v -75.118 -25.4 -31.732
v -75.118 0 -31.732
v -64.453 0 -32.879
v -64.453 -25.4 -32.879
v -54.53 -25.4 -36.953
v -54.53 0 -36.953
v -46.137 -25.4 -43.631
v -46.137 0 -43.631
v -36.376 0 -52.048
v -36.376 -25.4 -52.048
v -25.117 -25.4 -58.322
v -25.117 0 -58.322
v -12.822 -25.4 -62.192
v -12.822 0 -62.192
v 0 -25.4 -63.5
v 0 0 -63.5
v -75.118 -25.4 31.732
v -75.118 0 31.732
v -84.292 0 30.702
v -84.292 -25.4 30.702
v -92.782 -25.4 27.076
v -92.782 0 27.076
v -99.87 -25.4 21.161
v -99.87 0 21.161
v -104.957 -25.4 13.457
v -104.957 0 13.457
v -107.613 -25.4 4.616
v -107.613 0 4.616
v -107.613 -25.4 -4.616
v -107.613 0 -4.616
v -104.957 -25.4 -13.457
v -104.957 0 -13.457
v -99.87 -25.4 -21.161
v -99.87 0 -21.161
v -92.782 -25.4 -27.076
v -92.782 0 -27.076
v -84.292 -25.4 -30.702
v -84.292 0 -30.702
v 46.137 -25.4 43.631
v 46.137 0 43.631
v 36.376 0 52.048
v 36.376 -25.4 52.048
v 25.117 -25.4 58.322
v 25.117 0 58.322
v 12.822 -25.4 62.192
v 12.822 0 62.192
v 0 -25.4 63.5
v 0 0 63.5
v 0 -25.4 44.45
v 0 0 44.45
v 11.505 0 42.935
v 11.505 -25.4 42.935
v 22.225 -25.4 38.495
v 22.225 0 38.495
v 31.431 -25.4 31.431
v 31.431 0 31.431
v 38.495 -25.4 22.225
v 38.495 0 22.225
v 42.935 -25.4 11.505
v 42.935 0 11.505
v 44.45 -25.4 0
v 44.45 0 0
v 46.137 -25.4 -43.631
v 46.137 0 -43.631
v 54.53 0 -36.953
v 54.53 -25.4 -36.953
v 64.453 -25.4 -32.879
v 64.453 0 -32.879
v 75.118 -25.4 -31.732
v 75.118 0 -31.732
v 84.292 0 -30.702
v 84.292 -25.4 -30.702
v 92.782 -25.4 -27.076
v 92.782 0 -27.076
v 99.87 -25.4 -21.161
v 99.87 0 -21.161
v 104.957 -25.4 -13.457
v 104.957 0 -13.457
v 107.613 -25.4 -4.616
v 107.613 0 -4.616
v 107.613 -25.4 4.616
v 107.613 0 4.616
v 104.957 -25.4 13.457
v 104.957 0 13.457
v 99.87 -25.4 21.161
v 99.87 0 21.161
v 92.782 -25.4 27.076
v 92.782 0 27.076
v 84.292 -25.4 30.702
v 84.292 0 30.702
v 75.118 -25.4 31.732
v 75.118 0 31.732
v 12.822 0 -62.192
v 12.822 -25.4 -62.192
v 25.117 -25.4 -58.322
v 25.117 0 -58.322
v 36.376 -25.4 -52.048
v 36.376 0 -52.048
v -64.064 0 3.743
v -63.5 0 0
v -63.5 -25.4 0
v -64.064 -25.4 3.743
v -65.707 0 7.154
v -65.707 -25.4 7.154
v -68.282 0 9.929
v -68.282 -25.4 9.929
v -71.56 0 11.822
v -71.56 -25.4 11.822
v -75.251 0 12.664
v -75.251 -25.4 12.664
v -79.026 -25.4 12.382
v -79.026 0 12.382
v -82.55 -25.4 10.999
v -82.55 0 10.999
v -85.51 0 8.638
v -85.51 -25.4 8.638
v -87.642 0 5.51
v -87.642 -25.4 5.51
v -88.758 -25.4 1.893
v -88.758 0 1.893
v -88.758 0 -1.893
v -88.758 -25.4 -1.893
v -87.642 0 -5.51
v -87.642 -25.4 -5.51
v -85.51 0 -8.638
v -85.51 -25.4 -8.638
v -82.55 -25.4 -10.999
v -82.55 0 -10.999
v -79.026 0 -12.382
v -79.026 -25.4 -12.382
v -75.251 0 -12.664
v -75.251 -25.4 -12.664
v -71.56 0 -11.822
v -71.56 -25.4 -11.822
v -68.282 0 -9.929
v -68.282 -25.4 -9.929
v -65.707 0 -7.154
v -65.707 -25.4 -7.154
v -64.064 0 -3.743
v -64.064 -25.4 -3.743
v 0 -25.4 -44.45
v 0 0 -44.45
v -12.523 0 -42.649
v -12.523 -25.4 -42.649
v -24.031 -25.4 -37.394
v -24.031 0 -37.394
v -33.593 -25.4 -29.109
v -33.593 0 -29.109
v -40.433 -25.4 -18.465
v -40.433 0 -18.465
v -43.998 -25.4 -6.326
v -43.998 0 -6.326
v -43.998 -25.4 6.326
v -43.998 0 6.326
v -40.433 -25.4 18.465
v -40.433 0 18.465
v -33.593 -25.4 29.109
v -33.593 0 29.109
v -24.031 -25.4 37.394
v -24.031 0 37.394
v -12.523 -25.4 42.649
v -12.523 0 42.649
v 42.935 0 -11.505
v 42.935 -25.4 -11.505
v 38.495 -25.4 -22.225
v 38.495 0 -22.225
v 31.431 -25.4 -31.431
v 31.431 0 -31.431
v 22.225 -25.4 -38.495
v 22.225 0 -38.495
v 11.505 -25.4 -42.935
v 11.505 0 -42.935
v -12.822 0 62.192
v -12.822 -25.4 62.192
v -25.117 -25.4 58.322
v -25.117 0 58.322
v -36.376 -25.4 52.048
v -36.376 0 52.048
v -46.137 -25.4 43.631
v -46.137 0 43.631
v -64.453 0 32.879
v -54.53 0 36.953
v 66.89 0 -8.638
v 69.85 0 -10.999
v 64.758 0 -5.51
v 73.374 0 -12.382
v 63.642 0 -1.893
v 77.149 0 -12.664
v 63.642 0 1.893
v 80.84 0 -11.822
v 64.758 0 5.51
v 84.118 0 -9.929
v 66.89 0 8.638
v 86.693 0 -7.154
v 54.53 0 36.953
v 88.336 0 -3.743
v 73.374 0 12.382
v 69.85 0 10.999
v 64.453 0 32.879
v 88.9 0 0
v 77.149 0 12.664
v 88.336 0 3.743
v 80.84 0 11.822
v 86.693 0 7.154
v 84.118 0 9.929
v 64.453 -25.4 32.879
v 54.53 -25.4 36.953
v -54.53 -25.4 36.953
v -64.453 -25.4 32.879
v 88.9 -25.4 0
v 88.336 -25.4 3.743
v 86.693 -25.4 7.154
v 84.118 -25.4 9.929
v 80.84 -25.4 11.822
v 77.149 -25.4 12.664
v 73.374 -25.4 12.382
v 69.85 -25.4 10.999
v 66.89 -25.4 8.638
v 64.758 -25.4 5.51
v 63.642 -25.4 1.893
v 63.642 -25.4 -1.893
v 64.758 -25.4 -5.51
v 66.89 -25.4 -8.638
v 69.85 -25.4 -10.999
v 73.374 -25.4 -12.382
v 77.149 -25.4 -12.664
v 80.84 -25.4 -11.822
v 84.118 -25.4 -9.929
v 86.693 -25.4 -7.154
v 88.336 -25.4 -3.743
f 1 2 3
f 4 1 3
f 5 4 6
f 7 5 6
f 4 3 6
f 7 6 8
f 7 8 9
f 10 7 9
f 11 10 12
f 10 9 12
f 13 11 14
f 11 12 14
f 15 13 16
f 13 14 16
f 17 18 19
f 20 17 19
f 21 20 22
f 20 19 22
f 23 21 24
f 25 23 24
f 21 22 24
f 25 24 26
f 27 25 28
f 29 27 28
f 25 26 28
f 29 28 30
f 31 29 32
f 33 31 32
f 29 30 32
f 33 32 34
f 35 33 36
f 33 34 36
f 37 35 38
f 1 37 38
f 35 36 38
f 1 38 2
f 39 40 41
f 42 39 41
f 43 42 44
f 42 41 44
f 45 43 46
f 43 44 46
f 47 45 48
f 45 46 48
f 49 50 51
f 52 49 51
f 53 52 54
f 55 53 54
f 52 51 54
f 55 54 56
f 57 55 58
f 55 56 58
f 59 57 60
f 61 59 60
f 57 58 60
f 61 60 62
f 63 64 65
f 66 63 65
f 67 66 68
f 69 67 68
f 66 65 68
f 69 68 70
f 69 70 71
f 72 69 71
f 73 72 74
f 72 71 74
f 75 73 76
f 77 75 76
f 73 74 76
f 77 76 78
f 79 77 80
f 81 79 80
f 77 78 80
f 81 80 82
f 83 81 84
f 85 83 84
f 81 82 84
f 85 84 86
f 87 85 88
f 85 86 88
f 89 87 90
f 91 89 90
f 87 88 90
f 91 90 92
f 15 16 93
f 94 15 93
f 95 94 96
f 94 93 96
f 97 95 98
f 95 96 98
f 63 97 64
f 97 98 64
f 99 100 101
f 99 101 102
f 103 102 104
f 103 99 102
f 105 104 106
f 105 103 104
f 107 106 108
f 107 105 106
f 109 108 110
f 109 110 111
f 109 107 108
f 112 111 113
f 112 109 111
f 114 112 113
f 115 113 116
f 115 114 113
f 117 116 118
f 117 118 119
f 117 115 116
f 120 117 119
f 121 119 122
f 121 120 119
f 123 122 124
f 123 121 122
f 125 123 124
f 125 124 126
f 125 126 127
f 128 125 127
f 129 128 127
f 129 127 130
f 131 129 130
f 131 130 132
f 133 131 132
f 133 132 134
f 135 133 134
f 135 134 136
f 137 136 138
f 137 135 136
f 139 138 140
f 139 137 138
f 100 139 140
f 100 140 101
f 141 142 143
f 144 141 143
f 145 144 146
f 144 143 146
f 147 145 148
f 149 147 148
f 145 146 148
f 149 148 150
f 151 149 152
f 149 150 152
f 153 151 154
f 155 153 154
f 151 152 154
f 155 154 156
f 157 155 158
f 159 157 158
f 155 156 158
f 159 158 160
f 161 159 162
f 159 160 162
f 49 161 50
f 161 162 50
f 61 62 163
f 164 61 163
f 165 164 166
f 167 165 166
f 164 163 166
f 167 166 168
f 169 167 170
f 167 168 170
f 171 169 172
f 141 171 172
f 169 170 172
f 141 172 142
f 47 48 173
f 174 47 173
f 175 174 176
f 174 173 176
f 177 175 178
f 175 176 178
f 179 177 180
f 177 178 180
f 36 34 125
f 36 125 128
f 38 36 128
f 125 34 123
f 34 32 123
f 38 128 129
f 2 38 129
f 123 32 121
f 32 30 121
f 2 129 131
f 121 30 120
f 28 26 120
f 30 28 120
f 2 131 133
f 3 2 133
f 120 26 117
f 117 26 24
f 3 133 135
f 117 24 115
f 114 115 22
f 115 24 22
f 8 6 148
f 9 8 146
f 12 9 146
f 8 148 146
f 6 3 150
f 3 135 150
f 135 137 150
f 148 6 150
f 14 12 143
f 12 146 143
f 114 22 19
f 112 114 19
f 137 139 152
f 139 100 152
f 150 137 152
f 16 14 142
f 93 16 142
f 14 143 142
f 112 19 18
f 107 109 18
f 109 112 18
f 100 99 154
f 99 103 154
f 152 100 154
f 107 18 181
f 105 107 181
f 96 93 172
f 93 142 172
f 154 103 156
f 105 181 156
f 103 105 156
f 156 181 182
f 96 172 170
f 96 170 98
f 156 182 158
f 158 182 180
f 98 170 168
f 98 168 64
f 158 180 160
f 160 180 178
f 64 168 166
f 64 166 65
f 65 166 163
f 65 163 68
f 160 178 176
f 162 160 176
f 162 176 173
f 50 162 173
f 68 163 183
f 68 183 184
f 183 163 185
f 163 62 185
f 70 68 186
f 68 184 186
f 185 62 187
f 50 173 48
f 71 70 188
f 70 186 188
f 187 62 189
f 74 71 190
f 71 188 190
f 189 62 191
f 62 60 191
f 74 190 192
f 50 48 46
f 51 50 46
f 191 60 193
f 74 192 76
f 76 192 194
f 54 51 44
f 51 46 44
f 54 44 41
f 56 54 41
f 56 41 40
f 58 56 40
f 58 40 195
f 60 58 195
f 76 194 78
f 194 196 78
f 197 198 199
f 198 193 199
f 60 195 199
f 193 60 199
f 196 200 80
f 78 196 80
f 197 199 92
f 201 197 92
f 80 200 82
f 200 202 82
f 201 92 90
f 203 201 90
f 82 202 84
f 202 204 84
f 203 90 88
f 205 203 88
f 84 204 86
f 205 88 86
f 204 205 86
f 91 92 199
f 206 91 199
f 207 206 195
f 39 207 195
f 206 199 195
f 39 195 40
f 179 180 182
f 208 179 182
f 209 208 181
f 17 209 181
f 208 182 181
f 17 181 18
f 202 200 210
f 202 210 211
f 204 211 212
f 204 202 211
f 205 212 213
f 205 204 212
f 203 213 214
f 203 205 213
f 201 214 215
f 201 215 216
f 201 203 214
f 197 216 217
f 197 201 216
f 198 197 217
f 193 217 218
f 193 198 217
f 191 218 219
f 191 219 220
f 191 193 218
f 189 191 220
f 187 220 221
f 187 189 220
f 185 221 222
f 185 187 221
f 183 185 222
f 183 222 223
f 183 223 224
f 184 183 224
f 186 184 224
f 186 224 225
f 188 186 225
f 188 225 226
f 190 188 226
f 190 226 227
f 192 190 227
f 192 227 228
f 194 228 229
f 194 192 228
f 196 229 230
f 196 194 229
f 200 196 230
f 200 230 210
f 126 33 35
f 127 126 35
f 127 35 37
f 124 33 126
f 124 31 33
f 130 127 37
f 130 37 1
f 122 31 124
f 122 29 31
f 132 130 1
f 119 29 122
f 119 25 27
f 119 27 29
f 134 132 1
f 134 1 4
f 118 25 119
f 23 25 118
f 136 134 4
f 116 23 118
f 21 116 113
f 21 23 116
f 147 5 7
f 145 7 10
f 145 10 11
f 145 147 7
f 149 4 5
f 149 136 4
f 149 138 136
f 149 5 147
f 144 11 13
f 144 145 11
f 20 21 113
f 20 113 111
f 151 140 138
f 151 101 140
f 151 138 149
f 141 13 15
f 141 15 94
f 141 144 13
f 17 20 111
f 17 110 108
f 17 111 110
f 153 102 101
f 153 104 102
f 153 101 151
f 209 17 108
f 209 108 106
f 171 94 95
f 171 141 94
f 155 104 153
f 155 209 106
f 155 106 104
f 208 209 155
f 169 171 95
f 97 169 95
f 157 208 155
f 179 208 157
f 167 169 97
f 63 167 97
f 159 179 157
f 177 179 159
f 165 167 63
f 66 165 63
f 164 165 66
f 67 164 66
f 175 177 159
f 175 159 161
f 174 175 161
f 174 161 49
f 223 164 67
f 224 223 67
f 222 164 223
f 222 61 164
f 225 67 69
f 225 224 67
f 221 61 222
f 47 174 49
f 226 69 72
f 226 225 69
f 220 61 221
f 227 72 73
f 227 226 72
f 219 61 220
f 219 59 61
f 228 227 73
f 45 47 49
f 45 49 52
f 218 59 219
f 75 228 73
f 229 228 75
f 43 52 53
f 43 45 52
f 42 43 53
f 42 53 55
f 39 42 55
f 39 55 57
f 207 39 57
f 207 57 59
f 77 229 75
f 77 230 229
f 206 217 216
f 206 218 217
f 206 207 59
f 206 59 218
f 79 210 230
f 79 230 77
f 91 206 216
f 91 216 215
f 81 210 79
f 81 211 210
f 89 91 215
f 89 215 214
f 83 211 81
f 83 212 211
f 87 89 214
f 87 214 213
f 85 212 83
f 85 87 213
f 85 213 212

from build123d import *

# Parameters (mm, degrees)
F0_R     = 12.7
F1_DEPTH = 25.4


with BuildPart() as f1:
    # F0 (on Front) → F1 (new body)
    with BuildSketch(Plane.XZ):
        with BuildLine():
            ThreePointArc((0, -44.45), (-44.45, 0), (0, 44.45))
            Line((0, 44.45), (0, 63.5))
            ThreePointArc((0, 63.5), (-25.116623, 58.321568), (-46.136719, 43.630874))
            ThreePointArc((-46.136719, 43.630874), (-59.347524, 34.564632), (-75.117614, 31.731545))
            ThreePointArc((-75.117614, 31.731545), (-107.95, 0), (-75.117614, -31.731545))
            ThreePointArc((-75.117614, -31.731545), (-59.347524, -34.564632), (-46.136719, -43.630874))
            ThreePointArc((-46.136719, -43.630874), (-25.116623, -58.321568), (0, -63.5))
            Line((0, -63.5), (0, -44.45))
        make_face()
        with Locations((-76.2, 0)):
            Circle(F0_R, mode=Mode.SUBTRACT)
        with BuildLine():
            ThreePointArc((0, 44.45), (31.430896, 31.430896), (44.45, 0))
            ThreePointArc((44.45, 0), (31.430896, -31.430896), (0, -44.45))
            Line((0, -44.45), (0, -63.5))
            ThreePointArc((0, -63.5), (25.116623, -58.321568), (46.136719, -43.630874))
            ThreePointArc((46.136719, -43.630874), (59.347524, -34.564632), (75.117614, -31.731545))
            ThreePointArc((75.117614, -31.731545), (107.95, 0), (75.117614, 31.731545))
            ThreePointArc((75.117614, 31.731545), (59.347524, 34.564632), (46.136719, 43.630874))
            ThreePointArc((46.136719, 43.630874), (25.116623, 58.321568), (0, 63.5))
            Line((0, 63.5), (0, 44.45))
        make_face()
        with Locations((76.2, 0)):
            Circle(F0_R, mode=Mode.SUBTRACT)
    extrude(amount=F1_DEPTH)


solid = f1.part
